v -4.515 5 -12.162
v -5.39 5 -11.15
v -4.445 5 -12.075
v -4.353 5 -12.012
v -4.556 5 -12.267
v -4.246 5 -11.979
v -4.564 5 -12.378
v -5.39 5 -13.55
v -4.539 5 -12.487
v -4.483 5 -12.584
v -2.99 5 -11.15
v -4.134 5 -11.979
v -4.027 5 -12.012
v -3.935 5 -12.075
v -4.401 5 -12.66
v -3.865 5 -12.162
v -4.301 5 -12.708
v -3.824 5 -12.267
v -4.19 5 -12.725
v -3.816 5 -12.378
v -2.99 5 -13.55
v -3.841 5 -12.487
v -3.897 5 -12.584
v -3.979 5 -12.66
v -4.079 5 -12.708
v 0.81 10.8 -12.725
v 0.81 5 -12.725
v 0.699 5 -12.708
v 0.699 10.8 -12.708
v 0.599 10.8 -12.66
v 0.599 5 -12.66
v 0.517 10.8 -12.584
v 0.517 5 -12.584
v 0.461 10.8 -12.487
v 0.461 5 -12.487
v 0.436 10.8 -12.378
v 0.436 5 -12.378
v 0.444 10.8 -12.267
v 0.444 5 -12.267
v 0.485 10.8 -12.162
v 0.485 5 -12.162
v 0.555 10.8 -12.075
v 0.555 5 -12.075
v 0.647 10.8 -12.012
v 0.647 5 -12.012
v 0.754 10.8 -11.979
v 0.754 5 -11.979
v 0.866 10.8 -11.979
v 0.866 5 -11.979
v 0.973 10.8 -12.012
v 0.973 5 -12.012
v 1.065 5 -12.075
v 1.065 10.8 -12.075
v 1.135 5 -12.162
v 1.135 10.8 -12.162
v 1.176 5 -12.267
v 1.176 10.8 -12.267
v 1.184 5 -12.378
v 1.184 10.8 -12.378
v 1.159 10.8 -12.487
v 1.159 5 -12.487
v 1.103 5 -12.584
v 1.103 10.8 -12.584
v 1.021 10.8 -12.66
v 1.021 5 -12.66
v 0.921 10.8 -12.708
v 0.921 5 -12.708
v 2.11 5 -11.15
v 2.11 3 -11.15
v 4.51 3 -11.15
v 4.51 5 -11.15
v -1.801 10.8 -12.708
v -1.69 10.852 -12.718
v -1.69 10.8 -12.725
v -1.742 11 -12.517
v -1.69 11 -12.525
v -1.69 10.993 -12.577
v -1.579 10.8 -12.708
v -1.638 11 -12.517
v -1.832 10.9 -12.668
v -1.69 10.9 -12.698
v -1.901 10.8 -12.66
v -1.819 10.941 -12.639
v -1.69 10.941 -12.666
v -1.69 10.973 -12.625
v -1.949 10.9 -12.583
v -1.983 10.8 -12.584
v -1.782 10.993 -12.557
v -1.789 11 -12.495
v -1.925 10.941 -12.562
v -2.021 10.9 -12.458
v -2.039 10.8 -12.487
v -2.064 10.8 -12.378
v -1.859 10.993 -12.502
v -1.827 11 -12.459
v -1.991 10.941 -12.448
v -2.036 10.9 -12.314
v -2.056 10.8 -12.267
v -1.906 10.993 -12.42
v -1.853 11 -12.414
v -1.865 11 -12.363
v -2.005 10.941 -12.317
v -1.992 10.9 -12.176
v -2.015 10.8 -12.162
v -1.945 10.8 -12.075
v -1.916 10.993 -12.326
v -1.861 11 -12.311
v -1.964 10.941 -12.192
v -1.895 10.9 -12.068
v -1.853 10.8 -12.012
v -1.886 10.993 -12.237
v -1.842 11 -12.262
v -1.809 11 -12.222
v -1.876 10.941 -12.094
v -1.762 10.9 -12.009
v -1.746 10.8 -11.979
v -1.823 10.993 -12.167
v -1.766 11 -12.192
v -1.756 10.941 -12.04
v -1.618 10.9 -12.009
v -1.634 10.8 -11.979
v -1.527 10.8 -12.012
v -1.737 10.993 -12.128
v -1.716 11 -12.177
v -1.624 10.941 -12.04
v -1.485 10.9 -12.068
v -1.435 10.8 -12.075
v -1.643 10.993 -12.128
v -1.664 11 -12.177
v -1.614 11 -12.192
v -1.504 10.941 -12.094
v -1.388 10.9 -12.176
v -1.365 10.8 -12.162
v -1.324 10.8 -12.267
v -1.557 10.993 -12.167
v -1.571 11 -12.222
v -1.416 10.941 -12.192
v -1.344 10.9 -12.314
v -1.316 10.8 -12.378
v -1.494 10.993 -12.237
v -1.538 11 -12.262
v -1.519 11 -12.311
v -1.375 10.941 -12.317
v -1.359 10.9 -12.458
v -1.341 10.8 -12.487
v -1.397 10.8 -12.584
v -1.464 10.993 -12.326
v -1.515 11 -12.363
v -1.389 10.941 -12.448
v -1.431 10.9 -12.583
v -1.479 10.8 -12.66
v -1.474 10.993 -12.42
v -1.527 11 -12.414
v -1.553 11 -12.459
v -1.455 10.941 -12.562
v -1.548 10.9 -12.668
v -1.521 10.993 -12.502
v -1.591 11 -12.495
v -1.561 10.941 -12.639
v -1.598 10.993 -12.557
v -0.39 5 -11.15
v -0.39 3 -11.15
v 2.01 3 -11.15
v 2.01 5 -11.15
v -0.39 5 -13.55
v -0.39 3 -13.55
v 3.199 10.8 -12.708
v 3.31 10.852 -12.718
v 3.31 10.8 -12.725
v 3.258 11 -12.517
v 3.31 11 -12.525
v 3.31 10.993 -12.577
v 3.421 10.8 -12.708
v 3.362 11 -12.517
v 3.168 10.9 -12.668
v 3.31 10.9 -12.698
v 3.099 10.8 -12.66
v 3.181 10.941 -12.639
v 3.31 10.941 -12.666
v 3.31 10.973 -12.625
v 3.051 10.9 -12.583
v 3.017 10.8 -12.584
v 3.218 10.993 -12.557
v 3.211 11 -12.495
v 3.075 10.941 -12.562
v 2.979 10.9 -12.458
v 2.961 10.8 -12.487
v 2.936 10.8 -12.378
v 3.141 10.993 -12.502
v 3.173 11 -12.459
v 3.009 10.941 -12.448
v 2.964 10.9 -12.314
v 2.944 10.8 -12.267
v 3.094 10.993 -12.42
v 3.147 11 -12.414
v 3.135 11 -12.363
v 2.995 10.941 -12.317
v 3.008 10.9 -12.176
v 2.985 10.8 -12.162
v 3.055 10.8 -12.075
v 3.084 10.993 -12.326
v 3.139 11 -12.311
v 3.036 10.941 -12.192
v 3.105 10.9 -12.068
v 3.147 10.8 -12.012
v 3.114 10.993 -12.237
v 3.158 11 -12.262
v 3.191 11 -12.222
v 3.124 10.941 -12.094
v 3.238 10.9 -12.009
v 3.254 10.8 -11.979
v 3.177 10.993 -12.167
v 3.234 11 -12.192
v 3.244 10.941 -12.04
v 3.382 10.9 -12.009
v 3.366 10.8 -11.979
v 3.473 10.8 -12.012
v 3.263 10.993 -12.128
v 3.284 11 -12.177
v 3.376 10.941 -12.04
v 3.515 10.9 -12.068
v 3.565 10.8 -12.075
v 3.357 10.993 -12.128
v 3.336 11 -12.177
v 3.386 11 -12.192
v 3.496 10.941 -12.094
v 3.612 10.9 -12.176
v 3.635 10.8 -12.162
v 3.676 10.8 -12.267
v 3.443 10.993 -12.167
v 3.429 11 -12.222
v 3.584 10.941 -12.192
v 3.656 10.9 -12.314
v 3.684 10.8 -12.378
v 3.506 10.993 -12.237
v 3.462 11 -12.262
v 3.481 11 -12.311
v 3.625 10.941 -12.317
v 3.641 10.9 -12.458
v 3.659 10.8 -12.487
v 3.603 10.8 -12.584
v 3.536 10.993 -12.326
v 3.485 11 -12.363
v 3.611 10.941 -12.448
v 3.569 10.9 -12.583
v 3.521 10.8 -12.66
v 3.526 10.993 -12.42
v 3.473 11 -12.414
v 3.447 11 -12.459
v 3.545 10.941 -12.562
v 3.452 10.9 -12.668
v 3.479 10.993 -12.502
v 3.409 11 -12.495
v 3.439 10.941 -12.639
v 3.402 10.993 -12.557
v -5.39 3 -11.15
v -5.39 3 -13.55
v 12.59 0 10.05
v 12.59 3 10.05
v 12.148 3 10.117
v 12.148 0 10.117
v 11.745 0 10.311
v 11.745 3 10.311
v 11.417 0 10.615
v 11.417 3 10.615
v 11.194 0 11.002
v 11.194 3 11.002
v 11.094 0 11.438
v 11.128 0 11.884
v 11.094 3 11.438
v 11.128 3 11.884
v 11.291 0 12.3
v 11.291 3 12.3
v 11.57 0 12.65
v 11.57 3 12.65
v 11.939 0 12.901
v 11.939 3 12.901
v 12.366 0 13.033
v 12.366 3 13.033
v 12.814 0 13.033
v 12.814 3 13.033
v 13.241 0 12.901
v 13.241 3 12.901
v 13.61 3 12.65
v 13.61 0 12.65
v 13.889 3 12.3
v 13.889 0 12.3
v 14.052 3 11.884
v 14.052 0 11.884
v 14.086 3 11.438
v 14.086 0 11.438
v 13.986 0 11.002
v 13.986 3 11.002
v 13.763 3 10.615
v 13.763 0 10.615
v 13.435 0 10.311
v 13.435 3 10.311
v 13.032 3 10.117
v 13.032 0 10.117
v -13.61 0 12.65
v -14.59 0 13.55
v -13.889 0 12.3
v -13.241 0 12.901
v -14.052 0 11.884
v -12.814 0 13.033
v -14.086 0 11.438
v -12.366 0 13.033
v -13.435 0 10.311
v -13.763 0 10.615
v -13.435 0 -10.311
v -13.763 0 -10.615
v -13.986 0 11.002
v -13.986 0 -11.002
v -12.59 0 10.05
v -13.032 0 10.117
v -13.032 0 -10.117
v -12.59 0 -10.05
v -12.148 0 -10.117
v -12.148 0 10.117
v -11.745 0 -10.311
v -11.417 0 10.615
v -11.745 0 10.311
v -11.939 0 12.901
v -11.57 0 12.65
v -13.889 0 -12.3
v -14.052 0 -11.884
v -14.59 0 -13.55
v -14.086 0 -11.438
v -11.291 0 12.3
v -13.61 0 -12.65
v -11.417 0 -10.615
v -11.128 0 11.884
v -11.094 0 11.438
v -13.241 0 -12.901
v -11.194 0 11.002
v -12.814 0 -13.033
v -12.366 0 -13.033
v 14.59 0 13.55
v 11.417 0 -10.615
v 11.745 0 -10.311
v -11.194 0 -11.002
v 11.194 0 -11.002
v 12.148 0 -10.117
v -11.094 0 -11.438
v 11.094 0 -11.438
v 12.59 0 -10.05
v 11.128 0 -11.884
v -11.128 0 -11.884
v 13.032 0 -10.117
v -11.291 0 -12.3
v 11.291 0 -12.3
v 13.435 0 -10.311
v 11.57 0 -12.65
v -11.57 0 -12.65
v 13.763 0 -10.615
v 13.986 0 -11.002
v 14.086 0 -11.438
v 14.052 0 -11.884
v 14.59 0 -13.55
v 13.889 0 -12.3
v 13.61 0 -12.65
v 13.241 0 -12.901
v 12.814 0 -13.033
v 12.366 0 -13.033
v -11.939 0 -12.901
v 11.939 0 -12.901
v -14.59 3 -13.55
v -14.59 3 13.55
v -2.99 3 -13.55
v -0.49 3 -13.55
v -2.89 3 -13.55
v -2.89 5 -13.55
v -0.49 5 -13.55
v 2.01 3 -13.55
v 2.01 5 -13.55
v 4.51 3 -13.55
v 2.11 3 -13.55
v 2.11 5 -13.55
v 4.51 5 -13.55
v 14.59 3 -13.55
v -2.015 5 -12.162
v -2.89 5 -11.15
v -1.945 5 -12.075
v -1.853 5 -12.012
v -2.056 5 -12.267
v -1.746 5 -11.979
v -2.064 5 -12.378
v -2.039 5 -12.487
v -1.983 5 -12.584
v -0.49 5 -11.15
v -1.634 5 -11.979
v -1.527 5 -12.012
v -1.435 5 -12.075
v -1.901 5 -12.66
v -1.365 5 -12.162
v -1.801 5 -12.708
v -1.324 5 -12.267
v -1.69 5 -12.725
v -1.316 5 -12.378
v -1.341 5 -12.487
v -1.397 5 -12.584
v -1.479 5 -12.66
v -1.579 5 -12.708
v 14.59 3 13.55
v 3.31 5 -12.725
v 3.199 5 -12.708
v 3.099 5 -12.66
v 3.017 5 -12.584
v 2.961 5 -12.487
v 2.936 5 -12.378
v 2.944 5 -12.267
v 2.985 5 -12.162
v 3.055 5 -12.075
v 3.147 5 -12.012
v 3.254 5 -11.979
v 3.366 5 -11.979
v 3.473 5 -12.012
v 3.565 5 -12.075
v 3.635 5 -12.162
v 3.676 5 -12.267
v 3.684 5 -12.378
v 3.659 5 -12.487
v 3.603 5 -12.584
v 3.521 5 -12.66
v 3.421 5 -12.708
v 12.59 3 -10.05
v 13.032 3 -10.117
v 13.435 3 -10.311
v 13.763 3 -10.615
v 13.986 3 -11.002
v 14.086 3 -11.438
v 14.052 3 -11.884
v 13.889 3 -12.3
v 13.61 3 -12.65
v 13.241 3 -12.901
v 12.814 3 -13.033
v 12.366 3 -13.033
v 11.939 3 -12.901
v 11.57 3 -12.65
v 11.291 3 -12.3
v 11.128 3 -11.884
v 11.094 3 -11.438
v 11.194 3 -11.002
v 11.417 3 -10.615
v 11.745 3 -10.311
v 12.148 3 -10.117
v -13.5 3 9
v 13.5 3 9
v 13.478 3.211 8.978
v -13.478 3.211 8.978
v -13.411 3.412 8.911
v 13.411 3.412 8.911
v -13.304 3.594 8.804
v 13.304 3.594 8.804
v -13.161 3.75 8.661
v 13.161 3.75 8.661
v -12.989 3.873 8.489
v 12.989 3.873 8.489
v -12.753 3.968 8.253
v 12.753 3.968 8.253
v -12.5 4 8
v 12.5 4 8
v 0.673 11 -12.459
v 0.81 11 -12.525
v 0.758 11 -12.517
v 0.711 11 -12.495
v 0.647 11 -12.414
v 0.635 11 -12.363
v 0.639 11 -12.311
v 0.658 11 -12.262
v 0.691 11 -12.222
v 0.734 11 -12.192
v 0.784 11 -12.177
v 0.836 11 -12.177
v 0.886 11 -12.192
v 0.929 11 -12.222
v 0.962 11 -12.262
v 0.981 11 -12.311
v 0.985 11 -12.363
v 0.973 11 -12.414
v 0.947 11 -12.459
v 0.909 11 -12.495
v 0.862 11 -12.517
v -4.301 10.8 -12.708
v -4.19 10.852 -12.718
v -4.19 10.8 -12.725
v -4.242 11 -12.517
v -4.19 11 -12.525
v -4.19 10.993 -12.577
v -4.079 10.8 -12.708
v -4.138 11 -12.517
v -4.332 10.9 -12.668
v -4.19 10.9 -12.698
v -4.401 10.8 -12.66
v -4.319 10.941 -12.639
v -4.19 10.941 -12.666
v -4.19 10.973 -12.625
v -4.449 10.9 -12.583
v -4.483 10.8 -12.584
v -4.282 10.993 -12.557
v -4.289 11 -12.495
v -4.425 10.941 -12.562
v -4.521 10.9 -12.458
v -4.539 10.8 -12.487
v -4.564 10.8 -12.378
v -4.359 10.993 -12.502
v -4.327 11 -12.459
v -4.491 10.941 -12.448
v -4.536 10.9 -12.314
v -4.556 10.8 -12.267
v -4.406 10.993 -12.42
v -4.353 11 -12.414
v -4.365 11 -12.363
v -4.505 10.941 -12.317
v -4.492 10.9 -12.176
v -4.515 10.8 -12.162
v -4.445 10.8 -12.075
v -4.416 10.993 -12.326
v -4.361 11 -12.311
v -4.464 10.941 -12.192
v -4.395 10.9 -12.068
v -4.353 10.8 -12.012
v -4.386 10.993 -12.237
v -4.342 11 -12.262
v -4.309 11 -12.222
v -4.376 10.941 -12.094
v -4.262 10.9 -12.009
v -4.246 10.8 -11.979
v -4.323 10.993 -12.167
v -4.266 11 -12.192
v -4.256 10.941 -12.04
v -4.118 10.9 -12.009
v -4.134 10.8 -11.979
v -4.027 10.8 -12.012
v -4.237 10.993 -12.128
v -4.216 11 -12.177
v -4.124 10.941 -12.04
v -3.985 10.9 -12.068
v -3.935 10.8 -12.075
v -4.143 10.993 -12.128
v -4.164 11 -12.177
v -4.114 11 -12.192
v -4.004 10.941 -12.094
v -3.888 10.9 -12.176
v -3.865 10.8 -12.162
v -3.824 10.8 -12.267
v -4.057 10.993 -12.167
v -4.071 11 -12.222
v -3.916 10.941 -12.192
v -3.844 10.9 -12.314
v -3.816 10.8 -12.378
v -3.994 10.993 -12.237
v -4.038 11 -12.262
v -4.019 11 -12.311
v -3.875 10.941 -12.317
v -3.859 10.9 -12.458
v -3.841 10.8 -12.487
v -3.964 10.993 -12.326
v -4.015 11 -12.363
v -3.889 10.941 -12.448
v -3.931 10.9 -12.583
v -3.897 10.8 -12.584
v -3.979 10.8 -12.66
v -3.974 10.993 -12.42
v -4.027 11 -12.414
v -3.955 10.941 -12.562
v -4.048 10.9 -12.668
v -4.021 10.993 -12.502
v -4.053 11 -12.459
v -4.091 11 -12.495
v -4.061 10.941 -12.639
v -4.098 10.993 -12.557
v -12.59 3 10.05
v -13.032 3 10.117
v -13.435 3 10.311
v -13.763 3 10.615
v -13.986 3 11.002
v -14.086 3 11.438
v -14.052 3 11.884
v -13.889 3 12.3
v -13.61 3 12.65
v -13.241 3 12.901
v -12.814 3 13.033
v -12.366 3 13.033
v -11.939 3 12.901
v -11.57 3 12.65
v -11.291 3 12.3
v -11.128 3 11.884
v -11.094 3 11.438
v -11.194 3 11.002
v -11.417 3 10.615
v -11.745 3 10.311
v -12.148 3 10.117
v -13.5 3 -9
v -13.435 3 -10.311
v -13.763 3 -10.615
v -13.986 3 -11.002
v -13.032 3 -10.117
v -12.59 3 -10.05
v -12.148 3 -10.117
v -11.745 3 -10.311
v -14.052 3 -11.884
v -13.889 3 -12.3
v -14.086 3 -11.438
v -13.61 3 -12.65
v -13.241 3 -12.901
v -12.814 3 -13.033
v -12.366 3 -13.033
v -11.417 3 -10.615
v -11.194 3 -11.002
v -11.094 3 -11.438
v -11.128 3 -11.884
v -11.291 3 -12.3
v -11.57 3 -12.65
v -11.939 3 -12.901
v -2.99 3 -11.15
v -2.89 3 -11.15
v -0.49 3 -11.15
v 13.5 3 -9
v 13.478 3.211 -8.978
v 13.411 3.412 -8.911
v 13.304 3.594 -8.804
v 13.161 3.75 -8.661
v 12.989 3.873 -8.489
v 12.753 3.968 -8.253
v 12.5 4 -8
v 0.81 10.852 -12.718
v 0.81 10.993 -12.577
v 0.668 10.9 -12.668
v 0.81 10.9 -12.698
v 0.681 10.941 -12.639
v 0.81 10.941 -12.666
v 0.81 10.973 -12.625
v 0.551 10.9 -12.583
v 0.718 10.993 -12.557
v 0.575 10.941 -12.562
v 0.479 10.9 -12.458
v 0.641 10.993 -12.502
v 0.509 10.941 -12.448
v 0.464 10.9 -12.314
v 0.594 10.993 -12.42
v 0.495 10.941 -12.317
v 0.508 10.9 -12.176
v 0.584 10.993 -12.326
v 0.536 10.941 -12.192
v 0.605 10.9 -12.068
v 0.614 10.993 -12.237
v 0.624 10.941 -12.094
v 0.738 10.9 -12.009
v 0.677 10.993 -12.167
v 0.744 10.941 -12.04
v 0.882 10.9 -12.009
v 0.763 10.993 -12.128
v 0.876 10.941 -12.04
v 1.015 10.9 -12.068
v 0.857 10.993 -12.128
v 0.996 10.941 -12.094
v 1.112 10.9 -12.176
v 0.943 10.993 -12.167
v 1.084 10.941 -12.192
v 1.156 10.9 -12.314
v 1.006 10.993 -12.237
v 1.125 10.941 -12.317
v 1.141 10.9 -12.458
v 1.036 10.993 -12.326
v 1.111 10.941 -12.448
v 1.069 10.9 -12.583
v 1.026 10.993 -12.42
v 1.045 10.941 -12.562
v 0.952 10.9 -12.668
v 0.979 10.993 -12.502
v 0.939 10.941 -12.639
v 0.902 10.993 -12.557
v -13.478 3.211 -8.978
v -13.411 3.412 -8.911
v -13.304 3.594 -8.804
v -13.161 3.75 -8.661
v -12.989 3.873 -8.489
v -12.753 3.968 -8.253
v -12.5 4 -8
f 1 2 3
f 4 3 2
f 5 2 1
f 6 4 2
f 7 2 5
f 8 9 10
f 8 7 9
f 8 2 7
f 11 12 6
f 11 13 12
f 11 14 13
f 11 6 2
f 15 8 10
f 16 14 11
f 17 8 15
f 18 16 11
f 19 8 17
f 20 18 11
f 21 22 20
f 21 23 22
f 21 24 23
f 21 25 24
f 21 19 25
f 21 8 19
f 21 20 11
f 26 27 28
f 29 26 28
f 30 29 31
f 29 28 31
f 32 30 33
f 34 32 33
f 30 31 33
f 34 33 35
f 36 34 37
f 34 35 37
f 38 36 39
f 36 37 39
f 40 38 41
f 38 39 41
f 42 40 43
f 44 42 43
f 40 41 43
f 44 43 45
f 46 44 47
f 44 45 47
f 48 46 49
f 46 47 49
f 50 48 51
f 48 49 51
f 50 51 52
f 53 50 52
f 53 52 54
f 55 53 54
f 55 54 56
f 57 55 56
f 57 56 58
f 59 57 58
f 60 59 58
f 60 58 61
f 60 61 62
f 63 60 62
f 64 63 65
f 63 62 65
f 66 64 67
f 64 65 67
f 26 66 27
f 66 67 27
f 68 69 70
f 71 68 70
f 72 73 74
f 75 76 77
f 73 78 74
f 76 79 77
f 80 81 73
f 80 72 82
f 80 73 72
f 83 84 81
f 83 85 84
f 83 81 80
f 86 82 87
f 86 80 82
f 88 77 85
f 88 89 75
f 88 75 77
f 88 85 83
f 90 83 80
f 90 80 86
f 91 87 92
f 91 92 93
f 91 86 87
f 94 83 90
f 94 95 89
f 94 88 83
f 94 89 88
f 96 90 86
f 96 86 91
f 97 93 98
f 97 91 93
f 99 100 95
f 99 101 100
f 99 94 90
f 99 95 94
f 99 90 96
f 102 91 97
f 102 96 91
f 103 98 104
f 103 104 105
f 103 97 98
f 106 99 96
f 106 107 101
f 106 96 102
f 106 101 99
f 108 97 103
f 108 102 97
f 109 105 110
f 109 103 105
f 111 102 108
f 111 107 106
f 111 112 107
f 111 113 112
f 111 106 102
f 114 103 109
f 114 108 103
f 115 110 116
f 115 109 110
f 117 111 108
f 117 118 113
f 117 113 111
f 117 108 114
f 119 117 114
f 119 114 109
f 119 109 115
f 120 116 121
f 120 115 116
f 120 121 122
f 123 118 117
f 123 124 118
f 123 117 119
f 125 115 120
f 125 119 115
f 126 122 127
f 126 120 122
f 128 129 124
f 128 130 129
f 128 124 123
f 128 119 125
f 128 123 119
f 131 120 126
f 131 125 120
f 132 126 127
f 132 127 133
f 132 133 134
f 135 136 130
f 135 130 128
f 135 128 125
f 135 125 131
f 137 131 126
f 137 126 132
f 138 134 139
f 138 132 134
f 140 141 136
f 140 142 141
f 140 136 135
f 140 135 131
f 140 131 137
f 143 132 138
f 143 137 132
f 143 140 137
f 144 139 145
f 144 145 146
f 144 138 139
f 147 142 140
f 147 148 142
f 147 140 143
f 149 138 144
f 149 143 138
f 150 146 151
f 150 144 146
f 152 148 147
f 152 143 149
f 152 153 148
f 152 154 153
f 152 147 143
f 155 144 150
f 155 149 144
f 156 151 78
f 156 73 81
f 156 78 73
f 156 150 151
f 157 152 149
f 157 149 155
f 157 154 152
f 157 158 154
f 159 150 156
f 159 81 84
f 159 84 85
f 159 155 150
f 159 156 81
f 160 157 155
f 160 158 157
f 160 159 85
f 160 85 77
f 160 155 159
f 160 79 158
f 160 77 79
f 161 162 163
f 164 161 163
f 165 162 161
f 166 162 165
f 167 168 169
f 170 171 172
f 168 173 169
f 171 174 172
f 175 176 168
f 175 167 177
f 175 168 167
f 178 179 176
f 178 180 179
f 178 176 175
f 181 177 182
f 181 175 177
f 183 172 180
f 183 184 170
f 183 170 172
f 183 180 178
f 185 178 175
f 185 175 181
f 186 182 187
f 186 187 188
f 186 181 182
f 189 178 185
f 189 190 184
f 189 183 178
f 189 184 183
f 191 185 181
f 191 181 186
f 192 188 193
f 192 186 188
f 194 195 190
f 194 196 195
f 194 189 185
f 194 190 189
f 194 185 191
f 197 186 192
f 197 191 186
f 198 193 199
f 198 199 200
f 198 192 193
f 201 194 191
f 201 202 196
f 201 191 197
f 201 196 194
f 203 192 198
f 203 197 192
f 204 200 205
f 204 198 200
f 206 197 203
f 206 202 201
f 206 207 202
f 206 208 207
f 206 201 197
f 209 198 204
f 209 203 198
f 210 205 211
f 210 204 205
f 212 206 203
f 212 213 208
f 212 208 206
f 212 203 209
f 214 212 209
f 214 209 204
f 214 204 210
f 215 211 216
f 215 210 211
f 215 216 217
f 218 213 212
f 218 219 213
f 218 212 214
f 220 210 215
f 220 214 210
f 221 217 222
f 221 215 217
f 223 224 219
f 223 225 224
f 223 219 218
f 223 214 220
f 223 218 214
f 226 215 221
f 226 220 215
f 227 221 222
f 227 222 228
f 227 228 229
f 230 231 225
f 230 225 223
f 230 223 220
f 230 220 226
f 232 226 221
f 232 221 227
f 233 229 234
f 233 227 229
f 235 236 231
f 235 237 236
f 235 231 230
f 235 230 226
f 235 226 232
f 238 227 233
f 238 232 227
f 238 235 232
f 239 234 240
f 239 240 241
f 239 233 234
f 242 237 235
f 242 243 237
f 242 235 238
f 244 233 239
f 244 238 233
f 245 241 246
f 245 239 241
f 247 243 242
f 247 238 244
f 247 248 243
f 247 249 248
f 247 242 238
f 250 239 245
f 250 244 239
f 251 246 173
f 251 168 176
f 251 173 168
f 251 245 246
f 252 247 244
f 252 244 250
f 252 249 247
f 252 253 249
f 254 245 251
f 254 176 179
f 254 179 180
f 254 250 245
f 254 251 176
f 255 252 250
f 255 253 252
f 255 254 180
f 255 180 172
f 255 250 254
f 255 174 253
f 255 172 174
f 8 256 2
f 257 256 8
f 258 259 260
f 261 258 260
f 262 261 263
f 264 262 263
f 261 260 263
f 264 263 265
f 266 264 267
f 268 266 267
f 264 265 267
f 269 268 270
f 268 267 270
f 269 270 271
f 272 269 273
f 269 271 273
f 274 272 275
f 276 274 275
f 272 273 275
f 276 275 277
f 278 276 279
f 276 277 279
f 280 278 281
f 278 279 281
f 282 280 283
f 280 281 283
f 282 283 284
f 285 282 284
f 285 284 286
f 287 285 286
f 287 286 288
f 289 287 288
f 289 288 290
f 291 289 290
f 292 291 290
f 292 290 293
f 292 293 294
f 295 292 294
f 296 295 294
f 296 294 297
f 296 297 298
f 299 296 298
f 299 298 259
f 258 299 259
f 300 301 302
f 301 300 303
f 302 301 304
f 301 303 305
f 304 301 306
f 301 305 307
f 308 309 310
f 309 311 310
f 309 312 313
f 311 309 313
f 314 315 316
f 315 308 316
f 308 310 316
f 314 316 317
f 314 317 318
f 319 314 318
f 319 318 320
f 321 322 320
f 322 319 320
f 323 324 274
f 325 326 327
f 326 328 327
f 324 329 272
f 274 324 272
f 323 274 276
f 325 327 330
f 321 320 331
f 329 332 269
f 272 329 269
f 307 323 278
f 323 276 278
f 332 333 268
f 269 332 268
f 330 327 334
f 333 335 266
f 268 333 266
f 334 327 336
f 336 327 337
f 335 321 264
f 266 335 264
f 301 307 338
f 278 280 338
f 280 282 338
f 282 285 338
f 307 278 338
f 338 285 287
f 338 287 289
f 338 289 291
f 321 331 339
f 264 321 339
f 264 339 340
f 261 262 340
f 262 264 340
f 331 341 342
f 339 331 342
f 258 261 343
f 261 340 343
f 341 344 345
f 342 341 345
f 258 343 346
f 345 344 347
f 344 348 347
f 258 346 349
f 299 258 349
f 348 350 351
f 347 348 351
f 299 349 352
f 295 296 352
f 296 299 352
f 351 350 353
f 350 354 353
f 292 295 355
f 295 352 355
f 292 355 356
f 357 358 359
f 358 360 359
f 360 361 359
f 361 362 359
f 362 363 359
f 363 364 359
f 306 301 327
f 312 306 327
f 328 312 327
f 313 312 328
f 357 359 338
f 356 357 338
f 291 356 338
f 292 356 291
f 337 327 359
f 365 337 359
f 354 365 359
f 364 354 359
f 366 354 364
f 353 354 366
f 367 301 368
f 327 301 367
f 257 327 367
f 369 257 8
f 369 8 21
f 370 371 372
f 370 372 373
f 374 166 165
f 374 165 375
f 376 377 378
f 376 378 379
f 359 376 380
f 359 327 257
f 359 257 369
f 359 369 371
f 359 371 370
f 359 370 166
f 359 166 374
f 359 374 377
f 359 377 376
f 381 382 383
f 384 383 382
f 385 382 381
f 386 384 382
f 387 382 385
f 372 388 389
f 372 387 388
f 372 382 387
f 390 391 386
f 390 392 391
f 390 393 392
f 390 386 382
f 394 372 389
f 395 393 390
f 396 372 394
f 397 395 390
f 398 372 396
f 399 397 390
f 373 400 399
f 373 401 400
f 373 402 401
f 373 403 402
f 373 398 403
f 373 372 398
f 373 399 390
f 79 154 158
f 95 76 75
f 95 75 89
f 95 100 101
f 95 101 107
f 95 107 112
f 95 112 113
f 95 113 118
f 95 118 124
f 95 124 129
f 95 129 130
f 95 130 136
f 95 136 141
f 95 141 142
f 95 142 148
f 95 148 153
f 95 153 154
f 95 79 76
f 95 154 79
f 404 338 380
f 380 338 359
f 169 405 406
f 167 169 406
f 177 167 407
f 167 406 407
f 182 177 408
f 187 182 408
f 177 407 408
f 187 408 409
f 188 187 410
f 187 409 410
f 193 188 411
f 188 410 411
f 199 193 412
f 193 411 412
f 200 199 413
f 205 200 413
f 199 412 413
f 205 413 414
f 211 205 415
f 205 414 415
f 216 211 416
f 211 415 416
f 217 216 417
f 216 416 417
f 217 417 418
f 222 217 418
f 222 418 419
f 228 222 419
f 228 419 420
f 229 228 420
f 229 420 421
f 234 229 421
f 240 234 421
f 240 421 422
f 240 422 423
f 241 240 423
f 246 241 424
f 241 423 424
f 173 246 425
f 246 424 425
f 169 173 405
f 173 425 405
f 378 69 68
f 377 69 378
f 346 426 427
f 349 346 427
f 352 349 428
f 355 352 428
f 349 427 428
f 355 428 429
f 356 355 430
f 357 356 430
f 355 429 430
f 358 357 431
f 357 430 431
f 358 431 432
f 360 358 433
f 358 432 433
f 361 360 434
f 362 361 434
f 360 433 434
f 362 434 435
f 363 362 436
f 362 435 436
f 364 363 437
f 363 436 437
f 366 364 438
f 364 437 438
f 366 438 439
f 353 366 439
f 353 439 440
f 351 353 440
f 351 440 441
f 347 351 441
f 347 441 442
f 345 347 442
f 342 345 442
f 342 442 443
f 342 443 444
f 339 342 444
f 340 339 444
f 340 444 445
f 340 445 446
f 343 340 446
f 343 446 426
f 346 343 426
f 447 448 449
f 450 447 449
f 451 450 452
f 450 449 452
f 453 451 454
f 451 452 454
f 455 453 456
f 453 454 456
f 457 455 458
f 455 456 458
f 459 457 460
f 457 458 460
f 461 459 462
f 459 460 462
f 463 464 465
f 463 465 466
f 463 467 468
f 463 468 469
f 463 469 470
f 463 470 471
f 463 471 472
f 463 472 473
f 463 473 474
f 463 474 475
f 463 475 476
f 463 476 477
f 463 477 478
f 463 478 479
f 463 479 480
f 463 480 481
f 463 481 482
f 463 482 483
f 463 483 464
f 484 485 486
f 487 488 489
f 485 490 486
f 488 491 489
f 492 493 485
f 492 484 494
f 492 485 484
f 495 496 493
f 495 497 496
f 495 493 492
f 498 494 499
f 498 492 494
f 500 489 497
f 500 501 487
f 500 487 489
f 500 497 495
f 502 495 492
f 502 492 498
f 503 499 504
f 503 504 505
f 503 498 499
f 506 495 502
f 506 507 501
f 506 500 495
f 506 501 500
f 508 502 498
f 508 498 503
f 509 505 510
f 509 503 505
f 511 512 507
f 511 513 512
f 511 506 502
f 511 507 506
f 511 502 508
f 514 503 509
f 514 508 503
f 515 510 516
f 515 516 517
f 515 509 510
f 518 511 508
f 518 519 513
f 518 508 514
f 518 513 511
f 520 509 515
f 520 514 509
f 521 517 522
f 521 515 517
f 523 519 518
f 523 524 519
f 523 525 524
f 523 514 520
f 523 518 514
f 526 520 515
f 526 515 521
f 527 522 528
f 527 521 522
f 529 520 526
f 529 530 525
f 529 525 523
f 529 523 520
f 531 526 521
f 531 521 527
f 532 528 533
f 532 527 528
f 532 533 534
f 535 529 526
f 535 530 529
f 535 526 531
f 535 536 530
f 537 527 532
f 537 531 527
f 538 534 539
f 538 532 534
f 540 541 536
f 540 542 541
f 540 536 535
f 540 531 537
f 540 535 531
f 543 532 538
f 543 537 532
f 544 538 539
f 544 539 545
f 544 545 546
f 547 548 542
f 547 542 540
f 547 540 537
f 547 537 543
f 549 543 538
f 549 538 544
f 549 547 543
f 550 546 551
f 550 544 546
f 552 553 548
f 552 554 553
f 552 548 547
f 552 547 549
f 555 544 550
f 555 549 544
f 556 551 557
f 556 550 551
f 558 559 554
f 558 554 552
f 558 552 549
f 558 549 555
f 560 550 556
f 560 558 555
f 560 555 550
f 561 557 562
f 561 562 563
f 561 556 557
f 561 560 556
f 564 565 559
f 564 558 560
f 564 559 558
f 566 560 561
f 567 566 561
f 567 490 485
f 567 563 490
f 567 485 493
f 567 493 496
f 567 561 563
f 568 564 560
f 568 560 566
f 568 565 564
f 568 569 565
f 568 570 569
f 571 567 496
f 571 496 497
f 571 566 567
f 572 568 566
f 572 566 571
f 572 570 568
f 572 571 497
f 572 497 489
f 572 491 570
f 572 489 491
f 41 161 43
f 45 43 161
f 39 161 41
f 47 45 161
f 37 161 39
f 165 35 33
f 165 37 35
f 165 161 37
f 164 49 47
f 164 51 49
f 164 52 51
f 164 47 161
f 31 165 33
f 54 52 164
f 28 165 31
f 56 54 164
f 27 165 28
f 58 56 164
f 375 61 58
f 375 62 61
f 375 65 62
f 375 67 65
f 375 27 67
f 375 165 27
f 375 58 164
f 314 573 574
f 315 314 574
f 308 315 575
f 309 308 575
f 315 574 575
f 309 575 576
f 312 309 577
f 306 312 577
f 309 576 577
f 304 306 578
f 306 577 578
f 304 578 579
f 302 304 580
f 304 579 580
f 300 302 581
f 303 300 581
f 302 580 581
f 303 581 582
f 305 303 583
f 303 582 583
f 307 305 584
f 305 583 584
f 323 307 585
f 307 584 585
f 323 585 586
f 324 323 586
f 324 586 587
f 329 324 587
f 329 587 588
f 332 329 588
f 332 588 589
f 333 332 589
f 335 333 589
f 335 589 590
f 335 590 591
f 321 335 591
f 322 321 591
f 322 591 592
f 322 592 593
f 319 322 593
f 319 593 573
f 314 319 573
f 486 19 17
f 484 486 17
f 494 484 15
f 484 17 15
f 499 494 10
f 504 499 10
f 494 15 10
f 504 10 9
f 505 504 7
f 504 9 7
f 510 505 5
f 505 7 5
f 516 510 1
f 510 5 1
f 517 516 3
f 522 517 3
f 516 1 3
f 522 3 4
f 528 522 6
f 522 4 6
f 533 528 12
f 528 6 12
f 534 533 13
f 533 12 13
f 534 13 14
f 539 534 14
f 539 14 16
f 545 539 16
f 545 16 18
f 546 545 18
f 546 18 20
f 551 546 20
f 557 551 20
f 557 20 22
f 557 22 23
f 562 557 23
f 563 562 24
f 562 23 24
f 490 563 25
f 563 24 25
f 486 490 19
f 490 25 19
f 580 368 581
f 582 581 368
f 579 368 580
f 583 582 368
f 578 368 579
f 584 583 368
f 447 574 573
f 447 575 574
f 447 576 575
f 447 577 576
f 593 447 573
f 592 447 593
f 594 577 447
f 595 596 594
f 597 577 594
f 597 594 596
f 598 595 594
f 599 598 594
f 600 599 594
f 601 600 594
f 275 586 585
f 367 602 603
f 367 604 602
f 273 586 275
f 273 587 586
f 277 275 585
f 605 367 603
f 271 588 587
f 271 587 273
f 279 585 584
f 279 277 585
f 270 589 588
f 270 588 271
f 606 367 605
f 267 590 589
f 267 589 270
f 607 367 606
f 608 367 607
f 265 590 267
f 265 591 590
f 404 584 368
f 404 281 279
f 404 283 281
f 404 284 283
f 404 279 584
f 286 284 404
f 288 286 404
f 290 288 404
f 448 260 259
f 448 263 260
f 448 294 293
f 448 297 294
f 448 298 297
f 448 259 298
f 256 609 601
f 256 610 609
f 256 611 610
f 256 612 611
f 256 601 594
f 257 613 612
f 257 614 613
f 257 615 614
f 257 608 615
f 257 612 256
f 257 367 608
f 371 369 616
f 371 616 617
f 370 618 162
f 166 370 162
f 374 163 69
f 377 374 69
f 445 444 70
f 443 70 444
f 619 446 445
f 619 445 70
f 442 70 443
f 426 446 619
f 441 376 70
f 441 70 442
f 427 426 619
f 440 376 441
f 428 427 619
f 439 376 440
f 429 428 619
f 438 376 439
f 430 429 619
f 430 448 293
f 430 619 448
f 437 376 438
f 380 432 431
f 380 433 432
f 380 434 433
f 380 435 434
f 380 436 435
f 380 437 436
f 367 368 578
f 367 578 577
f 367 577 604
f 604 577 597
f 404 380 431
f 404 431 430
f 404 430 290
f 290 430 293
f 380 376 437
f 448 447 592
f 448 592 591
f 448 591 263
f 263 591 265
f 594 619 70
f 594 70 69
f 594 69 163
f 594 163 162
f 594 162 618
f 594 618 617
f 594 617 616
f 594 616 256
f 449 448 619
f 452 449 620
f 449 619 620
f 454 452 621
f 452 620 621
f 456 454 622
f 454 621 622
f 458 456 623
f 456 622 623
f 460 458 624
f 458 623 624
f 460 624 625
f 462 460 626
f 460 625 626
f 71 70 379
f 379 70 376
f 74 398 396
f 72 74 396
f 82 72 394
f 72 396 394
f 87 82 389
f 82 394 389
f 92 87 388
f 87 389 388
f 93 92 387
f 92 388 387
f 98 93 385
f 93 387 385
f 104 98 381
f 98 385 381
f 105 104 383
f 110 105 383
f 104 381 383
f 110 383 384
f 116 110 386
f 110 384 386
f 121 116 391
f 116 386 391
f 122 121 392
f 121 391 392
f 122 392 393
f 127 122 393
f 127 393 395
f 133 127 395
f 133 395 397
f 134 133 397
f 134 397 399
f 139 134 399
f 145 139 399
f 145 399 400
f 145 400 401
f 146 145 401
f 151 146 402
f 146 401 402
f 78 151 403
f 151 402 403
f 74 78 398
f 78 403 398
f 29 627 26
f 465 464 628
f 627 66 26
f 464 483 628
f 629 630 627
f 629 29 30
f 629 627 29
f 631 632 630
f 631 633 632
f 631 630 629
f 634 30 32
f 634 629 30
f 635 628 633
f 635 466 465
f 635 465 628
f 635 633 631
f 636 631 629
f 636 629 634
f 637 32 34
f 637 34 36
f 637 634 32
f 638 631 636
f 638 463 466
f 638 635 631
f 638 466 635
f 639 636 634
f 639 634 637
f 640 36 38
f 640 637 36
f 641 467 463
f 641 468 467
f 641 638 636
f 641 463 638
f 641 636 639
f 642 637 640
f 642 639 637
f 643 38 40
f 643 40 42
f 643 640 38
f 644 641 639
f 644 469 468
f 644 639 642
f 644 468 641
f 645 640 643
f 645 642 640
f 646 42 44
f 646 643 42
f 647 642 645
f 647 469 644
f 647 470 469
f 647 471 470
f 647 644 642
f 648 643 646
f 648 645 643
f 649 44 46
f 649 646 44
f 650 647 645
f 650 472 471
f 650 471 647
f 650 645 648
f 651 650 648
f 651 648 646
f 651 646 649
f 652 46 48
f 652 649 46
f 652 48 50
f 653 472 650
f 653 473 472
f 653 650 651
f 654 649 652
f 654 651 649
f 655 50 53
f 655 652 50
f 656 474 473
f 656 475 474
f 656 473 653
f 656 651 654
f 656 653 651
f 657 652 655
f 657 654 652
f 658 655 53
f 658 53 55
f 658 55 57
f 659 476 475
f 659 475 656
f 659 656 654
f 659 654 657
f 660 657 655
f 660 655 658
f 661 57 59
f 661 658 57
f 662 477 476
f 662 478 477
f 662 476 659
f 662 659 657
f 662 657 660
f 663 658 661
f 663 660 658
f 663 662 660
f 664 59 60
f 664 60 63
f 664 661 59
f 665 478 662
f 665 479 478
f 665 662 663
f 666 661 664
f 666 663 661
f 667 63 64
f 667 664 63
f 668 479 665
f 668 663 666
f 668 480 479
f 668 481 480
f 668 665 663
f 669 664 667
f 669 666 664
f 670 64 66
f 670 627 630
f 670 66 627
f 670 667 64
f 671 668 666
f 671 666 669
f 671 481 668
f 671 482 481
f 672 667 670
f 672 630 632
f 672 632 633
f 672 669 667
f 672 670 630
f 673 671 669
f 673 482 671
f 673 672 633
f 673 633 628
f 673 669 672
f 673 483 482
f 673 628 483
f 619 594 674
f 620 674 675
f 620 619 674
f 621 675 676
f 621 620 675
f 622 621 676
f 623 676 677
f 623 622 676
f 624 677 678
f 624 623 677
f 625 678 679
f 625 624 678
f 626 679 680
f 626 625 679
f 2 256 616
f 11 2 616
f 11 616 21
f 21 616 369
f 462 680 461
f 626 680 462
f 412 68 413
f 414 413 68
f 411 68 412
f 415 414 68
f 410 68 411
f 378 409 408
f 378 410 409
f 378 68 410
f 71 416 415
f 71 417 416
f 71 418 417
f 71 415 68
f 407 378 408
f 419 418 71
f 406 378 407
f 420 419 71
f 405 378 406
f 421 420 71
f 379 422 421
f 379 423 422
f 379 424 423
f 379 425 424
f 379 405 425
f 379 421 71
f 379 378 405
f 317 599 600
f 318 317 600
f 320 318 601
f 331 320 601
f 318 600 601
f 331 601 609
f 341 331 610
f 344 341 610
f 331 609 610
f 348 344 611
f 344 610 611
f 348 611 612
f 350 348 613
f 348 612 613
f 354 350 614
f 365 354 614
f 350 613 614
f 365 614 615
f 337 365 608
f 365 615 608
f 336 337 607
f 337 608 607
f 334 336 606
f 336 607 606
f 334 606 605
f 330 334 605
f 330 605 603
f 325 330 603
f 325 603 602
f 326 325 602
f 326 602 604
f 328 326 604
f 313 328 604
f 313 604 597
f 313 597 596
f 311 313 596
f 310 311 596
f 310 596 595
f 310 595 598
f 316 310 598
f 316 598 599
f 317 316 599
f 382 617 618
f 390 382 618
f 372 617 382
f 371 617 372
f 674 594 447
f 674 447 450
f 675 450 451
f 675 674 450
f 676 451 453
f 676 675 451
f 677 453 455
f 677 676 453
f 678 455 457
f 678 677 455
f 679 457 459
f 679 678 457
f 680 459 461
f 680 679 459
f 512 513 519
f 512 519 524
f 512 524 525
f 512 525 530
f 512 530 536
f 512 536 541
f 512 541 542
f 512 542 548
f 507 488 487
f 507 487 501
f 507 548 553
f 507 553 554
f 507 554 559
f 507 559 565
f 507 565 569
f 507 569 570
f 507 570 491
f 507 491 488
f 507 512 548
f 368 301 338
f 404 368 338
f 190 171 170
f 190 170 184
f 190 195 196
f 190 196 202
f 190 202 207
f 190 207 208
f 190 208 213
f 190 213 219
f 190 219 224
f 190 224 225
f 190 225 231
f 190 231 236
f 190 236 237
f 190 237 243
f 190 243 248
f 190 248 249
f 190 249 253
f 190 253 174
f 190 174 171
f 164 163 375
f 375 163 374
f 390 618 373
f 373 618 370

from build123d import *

# Parameters (mm, degrees)
SKETCH1_W           = 29.18
SKETCH1_H           = 27.1
BOSS_EXTRUDE1_DEPTH = 3
SKETCH2_W           = 27
SKETCH2_H           = 18
BOSS_EXTRUDE2_DEPTH = 1
FILLET1_R           = 1
SKETCH3_R           = 1.5
CUT_EXTRUDE1_DEPTH  = 21.136300554
SKETCH4_W           = 2.4
SKETCH4_H           = 2.4
BOSS_EXTRUDE3_DEPTH = 2
SKETCH5_R           = 0.375
BOSS_EXTRUDE4_DEPTH = 6
FILLET2_R           = 0.2


with BuildPart() as part:
    # Sketch1 → Boss-Extrude1 (new body)
    with BuildSketch(Plane(origin=(0, 0, 0), x_dir=(1, 0, 0), z_dir=(0, 1, 0))):
        Rectangle(SKETCH1_W, SKETCH1_H)
    extrude(amount=BOSS_EXTRUDE1_DEPTH)

    # Sketch2 → Boss-Extrude2 (add)
    with BuildSketch(Plane(origin=(0, 3, 0), x_dir=(1, 0, 0), z_dir=(0, 1, 0))):
        Rectangle(SKETCH2_W, SKETCH2_H)
    extrude(amount=BOSS_EXTRUDE2_DEPTH)

    # Fillet1
    fillet1_edges = [part.edges().sort_by_distance(p)[0] for p in [
        (0, 4, -9),
        (13.5, 4, 0),
        (0, 4, 9),
        (-13.5, 4, 0),
    ]]
    fillet(fillet1_edges, radius=FILLET1_R - 0.0001)  # a hair under: the kernel refuses the full size

    # Sketch3 → Cut-Extrude1 (cut, through all)
    with BuildSketch(Plane(origin=(0, 3, 0), x_dir=(1, 0, 0), z_dir=(0, 1, 0))):
        with Locations(Location((-12.59, 11.55, 0), (0, 0, 270))):
            Circle(SKETCH3_R)
        with Locations(Location((12.59, 11.55, 0), (0, 0, 270))):
            Circle(SKETCH3_R)
        with Locations(Location((12.59, -11.55, 0), (0, 0, 90))):
            Circle(SKETCH3_R)
        with Locations(Location((-12.59, -11.55, 0), (0, 0, 90))):
            Circle(SKETCH3_R)
    extrude(amount=-CUT_EXTRUDE1_DEPTH, mode=Mode.SUBTRACT)

    # Sketch4 → Boss-Extrude3 (add)
    with BuildSketch(Plane(origin=(0, 3, 0), x_dir=(1, 0, 0), z_dir=(0, 1, 0))):
        with Locations((-4.19, 12.35)):
            Rectangle(SKETCH4_W, SKETCH4_H)
        with Locations((-1.69, 12.35)):
            Rectangle(SKETCH4_W, SKETCH4_H)
        with Locations((0.81, 12.35)):
            Rectangle(SKETCH4_W, SKETCH4_H)
        with Locations((3.31, 12.35)):
            Rectangle(SKETCH4_W, SKETCH4_H)
    extrude(amount=BOSS_EXTRUDE3_DEPTH)

    # Sketch5 → Boss-Extrude4 (add)
    with BuildSketch(Plane(origin=(0, 5, 0), x_dir=(1, 0, 0), z_dir=(0, 1, 0))):
        with Locations(Location((-4.19, 12.35, 0), (0, 0, 90))):
            Circle(SKETCH5_R)
        with Locations(Location((-1.69, 12.35, 0), (0, 0, 90))):
            Circle(SKETCH5_R)
        with Locations(Location((0.81, 12.35, 0), (0, 0, 90))):
            Circle(SKETCH5_R)
        with Locations(Location((3.31, 12.35, 0), (0, 0, 90))):
            Circle(SKETCH5_R)
    extrude(amount=BOSS_EXTRUDE4_DEPTH)

    # Fillet2
    fillet2_edges = [part.edges().sort_by_distance(p)[0] for p in [
        (-4.19, 11, -11.975),
        (-1.69, 11, -11.975),
        (0.81, 11, -11.975),
        (3.31, 11, -11.975),
    ]]
    fillet(fillet2_edges, radius=FILLET2_R)


solid = part.part
